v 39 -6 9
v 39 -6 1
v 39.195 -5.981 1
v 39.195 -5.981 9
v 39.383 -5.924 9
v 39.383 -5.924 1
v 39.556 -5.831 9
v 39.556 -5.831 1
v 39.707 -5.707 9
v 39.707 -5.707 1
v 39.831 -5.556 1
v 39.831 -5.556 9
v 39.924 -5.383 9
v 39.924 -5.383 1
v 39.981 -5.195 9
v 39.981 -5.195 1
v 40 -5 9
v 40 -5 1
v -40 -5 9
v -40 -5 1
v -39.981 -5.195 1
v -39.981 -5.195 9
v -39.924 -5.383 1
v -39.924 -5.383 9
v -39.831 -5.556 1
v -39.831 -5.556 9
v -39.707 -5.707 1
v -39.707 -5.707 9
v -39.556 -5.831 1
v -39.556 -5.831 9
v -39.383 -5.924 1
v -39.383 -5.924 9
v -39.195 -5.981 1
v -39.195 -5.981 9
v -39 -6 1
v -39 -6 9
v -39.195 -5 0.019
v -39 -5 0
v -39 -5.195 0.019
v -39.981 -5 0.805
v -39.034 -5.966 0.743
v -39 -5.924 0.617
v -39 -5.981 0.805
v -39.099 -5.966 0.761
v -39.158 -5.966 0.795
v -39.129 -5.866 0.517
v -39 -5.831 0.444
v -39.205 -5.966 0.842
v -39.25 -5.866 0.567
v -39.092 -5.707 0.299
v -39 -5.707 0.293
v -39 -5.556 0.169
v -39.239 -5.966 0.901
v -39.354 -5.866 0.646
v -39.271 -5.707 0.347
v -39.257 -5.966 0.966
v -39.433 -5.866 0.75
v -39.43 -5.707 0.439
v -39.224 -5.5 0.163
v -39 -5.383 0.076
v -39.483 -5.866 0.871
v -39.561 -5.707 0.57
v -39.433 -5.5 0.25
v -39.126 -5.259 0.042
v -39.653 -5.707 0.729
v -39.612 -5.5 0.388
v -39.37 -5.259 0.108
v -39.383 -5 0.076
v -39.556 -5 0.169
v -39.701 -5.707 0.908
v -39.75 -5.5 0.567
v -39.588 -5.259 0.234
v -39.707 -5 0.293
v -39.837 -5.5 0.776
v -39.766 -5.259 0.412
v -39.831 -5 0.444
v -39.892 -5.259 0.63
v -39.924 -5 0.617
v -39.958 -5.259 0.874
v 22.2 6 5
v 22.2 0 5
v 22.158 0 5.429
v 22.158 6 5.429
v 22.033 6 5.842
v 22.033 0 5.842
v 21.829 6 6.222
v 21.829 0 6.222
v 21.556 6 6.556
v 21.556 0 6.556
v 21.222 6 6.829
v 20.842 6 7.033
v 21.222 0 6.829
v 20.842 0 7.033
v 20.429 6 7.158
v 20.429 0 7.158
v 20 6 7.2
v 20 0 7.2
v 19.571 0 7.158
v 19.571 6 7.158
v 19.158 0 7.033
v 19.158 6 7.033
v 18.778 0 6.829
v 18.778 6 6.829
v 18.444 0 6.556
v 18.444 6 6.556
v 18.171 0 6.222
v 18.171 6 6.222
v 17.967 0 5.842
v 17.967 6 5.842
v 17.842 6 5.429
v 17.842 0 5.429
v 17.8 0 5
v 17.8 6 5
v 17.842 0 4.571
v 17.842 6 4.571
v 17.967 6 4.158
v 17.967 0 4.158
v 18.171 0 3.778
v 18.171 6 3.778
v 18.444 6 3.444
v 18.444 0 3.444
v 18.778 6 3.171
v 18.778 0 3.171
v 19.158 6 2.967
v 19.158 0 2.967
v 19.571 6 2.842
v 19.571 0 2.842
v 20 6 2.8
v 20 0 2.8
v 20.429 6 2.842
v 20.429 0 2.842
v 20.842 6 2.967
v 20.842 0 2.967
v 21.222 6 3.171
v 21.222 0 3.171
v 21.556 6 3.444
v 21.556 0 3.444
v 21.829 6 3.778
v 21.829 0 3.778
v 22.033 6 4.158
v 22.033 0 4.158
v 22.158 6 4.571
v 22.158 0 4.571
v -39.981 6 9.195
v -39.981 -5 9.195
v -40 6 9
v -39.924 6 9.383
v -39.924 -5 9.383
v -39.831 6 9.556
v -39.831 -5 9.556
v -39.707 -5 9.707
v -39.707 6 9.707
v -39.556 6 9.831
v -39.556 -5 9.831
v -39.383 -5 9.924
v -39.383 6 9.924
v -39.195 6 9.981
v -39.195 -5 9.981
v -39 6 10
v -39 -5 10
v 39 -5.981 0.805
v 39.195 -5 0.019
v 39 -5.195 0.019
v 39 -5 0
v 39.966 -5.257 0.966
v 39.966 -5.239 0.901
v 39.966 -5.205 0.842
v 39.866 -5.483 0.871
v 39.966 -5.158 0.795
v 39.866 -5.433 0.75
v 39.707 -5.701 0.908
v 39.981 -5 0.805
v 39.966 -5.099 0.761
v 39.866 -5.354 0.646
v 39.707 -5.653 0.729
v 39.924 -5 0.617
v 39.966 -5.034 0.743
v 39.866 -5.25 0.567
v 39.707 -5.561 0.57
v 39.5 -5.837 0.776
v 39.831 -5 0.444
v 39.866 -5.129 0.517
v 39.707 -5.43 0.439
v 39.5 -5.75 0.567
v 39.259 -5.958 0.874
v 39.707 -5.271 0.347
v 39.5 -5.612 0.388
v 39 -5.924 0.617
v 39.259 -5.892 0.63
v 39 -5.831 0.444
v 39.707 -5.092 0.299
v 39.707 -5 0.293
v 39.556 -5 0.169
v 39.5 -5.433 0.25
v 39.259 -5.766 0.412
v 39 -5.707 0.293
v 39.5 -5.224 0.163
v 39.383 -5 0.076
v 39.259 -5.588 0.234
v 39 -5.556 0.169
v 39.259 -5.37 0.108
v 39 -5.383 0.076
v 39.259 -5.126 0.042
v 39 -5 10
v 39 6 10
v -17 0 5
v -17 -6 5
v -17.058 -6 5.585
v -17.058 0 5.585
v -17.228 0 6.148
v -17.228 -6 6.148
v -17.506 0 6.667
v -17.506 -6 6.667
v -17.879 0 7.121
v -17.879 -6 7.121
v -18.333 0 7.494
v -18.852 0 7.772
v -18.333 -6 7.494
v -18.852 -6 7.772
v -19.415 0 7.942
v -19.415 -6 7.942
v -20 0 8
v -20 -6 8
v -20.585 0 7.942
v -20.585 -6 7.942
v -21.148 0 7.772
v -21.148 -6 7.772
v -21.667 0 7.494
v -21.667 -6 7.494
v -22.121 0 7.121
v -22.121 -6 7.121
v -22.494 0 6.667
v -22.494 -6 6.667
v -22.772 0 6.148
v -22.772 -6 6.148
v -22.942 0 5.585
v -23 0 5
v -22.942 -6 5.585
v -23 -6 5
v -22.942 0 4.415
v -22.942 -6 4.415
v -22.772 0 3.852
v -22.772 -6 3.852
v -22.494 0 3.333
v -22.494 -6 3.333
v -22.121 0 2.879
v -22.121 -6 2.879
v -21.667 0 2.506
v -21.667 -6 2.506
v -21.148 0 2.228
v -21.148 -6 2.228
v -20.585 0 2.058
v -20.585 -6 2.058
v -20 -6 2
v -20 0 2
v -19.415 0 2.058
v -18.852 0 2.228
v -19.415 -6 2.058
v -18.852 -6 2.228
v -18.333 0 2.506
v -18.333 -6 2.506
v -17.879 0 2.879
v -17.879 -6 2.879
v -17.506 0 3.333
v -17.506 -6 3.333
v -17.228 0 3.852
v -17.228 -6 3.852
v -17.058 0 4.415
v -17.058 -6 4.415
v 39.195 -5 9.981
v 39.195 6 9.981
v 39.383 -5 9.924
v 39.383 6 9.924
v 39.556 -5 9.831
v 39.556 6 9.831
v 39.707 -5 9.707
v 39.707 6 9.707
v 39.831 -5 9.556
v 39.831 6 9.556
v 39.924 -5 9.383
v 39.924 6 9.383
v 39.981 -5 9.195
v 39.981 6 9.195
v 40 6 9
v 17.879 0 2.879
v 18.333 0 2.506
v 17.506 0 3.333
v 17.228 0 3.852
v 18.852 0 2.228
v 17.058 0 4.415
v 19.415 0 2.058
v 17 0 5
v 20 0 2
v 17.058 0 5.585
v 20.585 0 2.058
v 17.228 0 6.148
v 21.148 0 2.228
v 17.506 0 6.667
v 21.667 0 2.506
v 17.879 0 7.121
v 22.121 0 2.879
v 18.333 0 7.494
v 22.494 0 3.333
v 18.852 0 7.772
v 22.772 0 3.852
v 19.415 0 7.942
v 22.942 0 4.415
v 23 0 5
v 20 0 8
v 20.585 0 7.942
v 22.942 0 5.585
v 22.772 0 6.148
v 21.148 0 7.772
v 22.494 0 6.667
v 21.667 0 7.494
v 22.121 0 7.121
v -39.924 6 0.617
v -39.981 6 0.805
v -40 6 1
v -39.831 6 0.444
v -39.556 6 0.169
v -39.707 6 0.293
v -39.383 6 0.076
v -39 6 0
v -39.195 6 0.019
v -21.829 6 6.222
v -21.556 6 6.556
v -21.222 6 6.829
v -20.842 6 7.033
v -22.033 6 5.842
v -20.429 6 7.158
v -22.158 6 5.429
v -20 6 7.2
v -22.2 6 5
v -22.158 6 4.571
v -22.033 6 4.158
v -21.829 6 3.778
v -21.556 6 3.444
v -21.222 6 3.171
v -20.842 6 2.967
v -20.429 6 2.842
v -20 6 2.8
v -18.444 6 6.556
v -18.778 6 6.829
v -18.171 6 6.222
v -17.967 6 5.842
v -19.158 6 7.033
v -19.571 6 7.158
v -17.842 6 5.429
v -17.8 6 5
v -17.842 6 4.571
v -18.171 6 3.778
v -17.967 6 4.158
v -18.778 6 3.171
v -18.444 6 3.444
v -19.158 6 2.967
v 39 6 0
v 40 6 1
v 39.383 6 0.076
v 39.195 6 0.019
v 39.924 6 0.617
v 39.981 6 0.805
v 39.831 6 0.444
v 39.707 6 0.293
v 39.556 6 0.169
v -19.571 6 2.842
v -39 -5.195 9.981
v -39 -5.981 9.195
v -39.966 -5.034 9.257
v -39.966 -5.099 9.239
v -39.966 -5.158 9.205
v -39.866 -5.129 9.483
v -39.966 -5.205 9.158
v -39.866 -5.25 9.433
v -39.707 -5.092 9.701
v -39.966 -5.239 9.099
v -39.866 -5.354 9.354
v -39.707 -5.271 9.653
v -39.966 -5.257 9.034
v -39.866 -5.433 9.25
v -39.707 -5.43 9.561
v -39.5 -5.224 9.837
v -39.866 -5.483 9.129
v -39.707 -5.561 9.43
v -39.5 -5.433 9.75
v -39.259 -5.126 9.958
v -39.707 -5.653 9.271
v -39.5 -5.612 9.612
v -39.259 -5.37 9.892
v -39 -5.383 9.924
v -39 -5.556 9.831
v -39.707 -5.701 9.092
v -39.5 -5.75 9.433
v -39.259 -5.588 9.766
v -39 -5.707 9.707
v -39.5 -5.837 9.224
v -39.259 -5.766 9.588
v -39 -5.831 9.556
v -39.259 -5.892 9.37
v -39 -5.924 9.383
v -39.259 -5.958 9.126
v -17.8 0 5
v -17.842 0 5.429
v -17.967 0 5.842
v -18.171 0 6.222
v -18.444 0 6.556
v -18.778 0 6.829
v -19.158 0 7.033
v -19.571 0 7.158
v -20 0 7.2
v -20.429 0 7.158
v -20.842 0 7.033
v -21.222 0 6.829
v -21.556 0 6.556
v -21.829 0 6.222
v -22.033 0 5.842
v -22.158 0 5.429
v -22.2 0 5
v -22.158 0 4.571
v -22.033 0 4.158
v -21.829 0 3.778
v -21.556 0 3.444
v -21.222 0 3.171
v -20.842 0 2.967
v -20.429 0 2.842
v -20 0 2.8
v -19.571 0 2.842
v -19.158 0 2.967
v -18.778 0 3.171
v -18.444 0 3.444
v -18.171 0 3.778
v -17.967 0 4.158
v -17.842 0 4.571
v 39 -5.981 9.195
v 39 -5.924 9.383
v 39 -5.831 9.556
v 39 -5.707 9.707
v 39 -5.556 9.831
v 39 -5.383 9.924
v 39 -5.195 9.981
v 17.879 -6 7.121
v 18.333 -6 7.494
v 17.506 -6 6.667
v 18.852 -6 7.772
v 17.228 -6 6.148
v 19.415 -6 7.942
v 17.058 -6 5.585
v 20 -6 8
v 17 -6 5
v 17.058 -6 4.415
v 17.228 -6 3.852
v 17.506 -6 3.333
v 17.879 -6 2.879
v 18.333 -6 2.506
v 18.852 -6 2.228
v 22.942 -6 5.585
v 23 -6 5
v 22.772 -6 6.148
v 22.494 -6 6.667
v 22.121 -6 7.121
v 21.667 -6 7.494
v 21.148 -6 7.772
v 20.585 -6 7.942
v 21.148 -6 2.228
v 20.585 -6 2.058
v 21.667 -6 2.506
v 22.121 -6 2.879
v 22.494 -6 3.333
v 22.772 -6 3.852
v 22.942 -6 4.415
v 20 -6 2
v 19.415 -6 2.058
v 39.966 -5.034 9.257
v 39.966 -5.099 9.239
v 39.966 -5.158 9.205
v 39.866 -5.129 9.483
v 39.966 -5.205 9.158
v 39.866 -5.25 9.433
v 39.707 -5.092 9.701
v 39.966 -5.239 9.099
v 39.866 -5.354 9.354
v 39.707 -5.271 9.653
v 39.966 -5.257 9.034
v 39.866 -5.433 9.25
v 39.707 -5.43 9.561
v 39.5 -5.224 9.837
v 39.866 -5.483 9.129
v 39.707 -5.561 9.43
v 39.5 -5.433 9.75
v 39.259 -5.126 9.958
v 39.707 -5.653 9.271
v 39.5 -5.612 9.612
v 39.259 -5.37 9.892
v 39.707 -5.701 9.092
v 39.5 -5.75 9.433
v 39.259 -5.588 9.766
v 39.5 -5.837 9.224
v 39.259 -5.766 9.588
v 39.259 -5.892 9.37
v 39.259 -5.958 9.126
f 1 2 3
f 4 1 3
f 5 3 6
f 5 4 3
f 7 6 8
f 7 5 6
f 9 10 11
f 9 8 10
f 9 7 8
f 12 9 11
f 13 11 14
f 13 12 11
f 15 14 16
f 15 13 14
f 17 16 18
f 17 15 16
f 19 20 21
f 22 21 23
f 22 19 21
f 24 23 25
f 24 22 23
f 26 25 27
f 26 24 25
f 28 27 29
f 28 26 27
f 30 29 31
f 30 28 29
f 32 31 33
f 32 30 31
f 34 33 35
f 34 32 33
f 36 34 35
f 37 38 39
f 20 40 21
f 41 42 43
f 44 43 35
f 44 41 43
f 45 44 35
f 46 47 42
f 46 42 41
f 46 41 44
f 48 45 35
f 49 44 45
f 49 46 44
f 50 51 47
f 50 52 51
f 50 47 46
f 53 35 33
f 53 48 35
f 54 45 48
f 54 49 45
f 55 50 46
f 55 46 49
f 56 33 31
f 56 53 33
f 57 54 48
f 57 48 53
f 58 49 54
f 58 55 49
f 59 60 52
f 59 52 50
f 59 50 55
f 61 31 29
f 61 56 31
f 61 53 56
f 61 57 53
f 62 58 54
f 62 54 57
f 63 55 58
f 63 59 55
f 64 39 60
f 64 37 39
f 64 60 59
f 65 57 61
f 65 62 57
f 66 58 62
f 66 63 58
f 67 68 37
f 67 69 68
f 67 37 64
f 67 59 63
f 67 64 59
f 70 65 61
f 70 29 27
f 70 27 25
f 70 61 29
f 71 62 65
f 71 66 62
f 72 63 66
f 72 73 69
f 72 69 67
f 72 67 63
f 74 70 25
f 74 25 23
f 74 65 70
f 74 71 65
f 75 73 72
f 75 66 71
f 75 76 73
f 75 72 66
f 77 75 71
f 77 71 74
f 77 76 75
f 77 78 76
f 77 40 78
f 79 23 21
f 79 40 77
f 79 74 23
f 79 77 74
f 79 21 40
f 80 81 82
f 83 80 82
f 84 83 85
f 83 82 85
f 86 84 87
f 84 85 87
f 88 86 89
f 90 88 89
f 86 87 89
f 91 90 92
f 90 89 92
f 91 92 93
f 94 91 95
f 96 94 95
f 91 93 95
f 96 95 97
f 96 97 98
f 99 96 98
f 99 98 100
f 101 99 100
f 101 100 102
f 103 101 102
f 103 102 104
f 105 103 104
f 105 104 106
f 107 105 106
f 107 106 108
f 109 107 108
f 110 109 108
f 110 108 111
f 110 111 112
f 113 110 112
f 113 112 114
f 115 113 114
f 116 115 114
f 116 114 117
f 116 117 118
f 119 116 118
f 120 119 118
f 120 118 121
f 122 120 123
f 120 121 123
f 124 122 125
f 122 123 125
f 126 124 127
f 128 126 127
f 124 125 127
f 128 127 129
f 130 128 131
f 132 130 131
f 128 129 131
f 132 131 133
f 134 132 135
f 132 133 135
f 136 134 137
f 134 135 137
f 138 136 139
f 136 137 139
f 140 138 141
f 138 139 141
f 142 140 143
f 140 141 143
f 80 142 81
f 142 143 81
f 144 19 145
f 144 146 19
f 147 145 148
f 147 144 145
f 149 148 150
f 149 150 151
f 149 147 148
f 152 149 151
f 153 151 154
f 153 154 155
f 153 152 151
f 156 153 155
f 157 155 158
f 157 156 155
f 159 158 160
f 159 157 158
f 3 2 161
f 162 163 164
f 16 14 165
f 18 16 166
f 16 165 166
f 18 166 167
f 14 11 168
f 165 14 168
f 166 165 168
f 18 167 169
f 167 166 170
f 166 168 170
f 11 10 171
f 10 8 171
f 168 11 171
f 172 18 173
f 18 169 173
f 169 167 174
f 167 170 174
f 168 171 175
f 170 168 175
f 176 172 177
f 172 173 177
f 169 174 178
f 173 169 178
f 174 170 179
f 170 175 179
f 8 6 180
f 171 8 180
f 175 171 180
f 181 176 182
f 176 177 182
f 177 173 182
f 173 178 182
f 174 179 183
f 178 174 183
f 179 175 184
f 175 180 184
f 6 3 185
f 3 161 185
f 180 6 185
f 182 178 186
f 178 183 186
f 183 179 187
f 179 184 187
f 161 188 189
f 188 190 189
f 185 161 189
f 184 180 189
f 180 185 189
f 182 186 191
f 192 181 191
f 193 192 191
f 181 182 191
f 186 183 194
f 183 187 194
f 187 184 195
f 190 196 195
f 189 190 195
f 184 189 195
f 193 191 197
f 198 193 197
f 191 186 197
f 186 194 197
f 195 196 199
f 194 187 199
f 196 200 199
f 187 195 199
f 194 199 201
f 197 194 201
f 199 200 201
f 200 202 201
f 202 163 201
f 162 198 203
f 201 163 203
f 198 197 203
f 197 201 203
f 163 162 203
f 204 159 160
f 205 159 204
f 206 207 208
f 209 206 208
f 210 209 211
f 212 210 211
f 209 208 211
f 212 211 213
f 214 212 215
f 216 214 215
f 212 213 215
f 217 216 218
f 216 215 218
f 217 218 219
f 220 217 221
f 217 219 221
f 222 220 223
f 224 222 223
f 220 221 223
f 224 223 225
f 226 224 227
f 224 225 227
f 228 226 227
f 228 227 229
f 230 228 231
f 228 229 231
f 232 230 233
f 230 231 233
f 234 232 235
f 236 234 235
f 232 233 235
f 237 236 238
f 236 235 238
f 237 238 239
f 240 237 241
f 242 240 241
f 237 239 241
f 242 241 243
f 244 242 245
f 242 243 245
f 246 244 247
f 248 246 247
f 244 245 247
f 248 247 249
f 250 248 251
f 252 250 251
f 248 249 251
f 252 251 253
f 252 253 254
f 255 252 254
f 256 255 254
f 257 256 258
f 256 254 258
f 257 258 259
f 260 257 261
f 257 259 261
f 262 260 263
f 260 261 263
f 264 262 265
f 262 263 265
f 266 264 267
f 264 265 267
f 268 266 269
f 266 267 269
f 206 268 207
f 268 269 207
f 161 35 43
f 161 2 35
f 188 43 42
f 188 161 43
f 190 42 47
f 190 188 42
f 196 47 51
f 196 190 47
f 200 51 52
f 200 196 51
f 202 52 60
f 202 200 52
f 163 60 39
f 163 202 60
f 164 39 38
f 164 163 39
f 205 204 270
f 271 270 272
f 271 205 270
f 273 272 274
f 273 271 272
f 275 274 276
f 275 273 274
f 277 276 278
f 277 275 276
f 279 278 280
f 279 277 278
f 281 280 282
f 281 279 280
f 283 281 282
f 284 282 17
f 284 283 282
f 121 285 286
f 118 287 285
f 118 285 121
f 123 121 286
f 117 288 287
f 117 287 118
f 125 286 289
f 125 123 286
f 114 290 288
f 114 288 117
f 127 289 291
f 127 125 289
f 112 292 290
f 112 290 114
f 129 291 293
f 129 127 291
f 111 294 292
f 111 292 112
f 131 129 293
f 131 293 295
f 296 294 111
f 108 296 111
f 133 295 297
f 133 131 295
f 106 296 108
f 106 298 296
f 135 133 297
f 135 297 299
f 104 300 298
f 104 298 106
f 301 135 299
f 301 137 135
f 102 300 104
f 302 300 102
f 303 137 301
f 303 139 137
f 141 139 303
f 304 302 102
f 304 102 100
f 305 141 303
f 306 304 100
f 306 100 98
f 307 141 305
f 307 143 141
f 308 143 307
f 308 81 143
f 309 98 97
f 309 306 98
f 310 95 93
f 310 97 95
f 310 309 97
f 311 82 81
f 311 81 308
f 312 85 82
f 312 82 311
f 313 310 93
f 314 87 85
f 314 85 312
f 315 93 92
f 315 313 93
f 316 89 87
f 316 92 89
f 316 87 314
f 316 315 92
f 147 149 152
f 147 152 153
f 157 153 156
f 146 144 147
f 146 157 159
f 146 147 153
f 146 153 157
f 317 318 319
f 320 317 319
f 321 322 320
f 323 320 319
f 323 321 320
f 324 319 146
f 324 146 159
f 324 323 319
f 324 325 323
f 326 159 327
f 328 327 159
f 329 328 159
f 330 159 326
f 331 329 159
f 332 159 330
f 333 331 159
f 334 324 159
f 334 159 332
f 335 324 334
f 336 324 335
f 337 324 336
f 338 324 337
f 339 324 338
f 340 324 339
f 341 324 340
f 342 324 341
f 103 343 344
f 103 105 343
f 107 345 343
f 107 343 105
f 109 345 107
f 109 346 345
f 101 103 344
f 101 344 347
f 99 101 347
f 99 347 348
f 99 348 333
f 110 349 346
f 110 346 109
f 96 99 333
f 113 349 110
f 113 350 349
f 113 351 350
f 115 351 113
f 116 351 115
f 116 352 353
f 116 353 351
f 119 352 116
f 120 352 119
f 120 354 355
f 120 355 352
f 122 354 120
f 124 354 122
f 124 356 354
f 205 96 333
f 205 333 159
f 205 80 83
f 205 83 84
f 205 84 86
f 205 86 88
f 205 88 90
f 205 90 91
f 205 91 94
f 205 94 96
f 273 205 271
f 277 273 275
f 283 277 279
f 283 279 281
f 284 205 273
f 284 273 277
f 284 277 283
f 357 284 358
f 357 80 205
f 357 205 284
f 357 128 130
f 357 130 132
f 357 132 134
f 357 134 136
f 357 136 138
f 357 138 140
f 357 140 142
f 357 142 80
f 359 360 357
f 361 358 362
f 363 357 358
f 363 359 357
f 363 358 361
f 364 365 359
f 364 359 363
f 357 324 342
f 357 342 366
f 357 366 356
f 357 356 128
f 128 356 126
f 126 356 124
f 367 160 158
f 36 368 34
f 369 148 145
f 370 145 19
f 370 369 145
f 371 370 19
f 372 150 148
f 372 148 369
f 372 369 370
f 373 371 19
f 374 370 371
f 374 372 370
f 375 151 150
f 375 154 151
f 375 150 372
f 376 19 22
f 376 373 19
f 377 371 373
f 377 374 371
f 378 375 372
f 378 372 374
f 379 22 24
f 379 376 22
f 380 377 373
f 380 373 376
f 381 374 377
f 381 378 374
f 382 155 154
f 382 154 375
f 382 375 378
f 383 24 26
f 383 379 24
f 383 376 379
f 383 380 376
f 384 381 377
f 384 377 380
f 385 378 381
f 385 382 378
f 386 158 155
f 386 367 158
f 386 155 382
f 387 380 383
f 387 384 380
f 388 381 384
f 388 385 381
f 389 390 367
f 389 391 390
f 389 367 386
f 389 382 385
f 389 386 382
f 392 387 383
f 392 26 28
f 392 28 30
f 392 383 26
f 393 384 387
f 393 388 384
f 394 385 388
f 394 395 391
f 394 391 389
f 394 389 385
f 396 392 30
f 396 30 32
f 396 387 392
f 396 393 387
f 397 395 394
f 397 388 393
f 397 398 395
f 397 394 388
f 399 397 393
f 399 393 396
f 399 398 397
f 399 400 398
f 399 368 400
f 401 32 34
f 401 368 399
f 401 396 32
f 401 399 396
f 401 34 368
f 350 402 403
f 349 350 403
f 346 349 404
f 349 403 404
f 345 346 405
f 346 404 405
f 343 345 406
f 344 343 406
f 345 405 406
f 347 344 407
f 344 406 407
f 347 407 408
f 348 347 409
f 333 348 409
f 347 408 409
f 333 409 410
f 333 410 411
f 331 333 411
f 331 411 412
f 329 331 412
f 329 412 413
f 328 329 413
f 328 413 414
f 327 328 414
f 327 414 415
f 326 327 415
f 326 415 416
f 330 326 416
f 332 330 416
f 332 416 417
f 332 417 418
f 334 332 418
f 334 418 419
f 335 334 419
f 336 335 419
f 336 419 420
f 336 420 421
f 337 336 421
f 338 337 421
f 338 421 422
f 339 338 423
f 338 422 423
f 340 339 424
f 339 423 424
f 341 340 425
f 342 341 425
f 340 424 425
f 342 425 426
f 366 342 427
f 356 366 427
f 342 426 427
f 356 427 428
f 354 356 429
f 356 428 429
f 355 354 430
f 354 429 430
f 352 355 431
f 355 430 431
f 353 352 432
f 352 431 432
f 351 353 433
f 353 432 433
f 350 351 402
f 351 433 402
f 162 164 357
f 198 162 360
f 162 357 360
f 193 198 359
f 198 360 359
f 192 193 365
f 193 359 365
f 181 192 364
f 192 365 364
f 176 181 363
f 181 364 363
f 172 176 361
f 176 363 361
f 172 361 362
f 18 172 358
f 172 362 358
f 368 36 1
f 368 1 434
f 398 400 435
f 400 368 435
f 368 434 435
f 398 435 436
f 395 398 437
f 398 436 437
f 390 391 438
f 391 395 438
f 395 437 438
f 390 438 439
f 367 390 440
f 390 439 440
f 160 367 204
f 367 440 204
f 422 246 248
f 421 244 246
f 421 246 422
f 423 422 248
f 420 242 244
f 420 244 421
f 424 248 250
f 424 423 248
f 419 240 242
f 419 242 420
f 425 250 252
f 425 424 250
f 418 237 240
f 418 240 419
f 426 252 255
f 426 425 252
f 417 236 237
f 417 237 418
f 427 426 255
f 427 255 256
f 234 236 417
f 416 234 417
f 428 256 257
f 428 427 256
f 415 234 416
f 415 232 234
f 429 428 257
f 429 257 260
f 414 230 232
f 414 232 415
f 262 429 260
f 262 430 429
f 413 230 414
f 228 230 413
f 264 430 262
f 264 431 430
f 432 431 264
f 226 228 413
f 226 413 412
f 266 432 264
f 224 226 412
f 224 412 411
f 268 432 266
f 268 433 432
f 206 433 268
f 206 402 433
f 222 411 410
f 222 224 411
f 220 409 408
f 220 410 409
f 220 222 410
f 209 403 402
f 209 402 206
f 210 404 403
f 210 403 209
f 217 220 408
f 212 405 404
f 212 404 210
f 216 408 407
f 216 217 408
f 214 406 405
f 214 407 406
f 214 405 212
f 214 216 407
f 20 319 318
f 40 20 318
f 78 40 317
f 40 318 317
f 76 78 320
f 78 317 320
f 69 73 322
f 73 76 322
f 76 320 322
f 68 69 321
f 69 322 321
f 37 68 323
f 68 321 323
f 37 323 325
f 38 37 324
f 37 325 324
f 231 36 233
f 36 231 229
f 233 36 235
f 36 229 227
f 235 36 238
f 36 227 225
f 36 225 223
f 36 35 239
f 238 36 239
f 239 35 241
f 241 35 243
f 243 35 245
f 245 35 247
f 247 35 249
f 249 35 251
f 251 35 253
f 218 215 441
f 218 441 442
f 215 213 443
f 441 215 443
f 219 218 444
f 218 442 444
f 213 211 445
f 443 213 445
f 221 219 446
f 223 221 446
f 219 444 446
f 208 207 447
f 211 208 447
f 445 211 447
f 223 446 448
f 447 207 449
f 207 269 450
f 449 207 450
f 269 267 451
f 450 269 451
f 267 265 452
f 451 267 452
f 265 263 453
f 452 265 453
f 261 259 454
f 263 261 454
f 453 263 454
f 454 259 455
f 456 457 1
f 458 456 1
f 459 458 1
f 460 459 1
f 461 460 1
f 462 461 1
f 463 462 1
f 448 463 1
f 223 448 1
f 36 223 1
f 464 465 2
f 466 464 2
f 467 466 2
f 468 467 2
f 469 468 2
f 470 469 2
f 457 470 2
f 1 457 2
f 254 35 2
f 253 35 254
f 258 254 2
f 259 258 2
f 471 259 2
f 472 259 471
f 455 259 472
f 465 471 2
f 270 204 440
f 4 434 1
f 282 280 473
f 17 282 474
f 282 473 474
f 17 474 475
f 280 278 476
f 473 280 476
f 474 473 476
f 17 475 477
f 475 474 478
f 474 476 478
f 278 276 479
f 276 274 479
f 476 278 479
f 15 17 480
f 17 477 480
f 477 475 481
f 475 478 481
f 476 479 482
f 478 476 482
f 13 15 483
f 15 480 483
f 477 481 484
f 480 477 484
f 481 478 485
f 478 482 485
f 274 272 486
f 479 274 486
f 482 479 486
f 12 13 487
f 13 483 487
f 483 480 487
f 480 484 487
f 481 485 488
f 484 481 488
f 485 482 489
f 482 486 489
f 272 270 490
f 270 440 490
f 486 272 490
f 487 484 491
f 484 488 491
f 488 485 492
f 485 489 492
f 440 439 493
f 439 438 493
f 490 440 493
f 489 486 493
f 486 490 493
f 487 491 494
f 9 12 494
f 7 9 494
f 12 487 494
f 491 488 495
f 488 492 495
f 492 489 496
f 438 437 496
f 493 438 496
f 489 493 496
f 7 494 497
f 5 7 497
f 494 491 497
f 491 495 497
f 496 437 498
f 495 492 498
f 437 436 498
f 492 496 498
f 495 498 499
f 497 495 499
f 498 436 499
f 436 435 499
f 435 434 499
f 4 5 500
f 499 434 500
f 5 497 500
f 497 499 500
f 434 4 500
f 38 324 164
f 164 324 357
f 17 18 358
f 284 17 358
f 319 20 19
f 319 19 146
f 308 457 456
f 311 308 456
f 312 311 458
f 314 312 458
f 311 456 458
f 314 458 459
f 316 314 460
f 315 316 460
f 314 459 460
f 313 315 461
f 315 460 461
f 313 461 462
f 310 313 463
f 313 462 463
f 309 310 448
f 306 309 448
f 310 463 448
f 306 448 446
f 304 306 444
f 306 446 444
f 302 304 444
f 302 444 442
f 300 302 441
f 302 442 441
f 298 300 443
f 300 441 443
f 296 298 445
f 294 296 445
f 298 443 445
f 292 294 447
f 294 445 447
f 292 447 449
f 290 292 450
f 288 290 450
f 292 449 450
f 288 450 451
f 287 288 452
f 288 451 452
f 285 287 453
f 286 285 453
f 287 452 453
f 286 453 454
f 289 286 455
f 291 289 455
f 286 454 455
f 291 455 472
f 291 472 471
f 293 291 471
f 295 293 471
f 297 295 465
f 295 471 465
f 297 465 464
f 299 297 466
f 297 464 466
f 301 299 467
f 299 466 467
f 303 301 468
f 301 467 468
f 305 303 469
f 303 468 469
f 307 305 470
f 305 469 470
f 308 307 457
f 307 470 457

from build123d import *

# Parameters (mm, degrees)
F0_W     = 80
F0_H     = 12
F1_DEPTH = 10
F2_R     = 2.2
F3_DEPTH = 12.001
F2_R_2   = 3
F4_DEPTH = 6
F5_R     = 1


with BuildPart() as f1:
    # F0 (on Top) → F1 (new body)
    with BuildSketch(Plane.XY):
        Rectangle(F0_W, F0_H)
    extrude(amount=F1_DEPTH)

    # F2 (on face) → F3 (cut, through all)
    with BuildSketch(Plane.XZ.offset(6)):
        with Locations((-20, 5)):
            Circle(F2_R)
        with Locations((20, 5)):
            Circle(F2_R)
    extrude(amount=-F3_DEPTH, mode=Mode.SUBTRACT)

    # F2 (on face) → F4 (cut)
    with BuildSketch(Plane.XZ.offset(6)):
        with Locations((-20, 5)):
            Circle(F2_R_2)
        with Locations((-20, 5)):
            Circle(F2_R, mode=Mode.SUBTRACT)
        with Locations((20, 5)):
            Circle(F2_R_2)
        with Locations((20, 5)):
            Circle(F2_R, mode=Mode.SUBTRACT)
    extrude(amount=-F4_DEPTH, mode=Mode.SUBTRACT)

    # F5
    f5_edges = [f1.edges().sort_by_distance(p)[0] for p in [
        (0, -6, 10),
        (-40, 0, 10),
        (40, 0, 10),
        (-40, 0, 0),
        (0, -6, 0),
        (40, -6, 5),
        (-40, -6, 5),
        (40, 0, 0),
    ]]
    fillet(f5_edges, radius=F5_R)


solid = f1.part
